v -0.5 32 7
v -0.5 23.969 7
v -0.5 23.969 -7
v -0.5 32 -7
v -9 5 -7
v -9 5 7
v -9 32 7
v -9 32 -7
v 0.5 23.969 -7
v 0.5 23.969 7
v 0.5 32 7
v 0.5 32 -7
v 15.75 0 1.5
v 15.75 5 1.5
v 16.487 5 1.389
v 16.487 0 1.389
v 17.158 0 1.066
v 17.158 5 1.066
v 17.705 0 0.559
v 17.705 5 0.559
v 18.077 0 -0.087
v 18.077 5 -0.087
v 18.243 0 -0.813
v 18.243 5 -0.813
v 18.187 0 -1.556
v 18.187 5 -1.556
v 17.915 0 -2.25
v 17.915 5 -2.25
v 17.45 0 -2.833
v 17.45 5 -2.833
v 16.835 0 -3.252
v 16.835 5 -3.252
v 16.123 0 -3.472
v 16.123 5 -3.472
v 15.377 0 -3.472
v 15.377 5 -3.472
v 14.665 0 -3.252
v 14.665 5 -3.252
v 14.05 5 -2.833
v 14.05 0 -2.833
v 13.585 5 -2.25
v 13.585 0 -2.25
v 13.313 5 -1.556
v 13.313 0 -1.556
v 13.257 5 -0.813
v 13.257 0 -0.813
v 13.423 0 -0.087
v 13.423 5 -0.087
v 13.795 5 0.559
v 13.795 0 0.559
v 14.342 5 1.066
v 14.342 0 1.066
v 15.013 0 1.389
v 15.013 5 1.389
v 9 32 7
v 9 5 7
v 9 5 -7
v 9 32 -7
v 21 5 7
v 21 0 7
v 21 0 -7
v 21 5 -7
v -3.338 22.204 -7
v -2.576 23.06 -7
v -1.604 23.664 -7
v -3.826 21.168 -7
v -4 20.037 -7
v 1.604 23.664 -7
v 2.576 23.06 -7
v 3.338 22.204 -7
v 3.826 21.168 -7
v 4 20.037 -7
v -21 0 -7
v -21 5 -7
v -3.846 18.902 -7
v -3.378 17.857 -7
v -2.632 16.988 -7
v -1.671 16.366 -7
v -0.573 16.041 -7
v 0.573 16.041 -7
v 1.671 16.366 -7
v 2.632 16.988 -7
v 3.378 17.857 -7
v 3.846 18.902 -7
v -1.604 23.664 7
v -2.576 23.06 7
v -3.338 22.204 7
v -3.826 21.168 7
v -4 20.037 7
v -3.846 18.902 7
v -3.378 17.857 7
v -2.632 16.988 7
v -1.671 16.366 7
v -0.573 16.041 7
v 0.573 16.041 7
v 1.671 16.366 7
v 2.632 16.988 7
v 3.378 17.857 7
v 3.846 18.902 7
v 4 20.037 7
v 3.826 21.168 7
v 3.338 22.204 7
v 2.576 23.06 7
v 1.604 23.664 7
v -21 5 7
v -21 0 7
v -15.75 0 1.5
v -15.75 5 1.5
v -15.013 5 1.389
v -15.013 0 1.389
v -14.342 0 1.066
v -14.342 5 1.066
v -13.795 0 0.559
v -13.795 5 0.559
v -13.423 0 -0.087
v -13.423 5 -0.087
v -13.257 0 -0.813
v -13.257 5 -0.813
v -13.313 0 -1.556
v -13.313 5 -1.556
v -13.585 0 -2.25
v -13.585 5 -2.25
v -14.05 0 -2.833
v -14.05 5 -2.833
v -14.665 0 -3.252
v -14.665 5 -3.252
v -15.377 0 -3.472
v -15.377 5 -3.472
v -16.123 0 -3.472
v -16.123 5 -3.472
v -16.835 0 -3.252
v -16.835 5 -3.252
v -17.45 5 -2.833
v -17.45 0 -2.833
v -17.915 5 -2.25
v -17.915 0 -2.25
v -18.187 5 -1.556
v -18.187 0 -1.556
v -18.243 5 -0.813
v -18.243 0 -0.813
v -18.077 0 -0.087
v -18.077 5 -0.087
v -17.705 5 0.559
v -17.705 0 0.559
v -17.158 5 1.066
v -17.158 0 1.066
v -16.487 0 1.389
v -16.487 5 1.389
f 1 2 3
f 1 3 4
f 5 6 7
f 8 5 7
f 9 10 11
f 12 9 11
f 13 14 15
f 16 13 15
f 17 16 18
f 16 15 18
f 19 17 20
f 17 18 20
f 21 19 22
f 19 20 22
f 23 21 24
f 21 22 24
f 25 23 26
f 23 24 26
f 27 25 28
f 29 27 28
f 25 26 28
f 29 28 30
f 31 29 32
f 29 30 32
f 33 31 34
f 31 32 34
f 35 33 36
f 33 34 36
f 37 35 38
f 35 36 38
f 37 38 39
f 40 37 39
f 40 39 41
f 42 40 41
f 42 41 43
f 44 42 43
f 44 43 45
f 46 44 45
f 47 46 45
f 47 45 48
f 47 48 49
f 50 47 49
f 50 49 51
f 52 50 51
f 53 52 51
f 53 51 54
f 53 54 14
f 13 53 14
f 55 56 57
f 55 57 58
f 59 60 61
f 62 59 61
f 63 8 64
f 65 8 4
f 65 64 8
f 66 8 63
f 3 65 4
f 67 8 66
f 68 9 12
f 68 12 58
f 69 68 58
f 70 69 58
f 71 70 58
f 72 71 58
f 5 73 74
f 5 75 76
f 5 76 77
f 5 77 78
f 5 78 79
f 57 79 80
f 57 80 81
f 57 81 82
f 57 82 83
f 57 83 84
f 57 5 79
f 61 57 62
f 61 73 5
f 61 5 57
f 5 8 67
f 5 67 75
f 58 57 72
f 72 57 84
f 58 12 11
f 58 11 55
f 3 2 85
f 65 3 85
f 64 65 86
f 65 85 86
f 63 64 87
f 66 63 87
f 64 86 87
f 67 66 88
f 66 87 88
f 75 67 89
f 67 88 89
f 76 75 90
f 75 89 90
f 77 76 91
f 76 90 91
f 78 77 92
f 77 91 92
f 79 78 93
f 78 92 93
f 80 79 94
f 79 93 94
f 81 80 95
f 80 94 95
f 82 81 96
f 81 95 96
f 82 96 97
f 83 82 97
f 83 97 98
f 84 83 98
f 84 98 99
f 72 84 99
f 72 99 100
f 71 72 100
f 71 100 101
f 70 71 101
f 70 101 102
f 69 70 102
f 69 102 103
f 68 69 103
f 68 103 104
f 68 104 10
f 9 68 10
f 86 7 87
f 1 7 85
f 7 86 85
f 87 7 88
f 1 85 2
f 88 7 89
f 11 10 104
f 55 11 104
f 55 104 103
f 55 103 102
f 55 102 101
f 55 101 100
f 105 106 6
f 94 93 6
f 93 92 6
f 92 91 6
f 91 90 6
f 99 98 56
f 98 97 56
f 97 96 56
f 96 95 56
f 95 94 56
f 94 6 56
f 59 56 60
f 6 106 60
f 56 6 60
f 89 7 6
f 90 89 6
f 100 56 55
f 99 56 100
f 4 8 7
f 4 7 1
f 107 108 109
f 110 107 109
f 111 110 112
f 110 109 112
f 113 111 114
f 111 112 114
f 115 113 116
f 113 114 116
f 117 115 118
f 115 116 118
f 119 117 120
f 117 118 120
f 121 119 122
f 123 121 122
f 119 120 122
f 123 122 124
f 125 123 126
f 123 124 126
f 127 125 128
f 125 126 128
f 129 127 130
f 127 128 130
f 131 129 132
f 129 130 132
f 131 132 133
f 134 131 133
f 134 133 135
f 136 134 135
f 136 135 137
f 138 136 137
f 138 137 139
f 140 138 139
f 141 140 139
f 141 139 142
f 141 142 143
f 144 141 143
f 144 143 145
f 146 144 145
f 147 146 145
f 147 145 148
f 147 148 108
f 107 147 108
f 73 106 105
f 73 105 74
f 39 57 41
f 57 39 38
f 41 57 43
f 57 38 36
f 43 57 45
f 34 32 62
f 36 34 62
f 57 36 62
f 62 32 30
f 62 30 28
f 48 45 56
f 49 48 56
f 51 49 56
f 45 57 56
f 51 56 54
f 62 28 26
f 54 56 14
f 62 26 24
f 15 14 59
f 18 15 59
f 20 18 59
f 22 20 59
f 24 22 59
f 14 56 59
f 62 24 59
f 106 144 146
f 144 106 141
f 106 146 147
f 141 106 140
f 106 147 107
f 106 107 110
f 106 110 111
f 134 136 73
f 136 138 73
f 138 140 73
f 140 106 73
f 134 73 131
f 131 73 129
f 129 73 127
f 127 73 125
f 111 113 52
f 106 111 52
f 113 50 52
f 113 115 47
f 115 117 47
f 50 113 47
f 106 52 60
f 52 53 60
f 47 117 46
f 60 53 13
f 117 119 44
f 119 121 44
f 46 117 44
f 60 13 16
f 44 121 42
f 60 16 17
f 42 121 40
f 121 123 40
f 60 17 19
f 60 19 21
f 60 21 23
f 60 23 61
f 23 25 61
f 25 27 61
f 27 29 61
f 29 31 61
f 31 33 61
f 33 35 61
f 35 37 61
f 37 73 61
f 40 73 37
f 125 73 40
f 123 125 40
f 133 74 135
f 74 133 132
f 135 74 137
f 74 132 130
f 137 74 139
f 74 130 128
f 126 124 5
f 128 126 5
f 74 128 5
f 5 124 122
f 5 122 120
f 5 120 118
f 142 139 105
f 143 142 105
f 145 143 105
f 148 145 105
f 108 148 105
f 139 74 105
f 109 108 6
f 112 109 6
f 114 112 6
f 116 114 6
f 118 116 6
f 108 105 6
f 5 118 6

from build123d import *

# Parameters (mm, degrees)
ESQUISSE1_W             = 42
ESQUISSE1_H             = 14
BOSS_EXTRU_1_DEPTH      = 32
ESQUISSE2_W             = 12
ESQUISSE2_H             = 27
ENL_V_MAT_EXTRU_1_DEPTH = 41.755367745
ESQUISSE3_R             = 4
ENL_V_MAT_EXTRU_2_DEPTH = 41.755367745
ESQUISSE4_W             = 1
ESQUISSE4_H             = 13.961299029
ENL_V_MAT_EXTRU_3_DEPTH = 41.755367745
ESQUISSE5_R             = 2.5
ENL_V_MAT_EXTRU_4_DEPTH = 35.9141805


with BuildPart() as part:
    # Esquisse1 → Boss.-Extru.1 (new body)
    with BuildSketch(Plane(origin=(0, 0, 0), x_dir=(1, 0, 0), z_dir=(0, 1, 0))):
        Rectangle(ESQUISSE1_W, ESQUISSE1_H)
    extrude(amount=BOSS_EXTRU_1_DEPTH)

    # Esquisse2 → Enlèv. mat.-Extru.1 (cut, through all)
    with BuildSketch(Plane.XY.offset(7)):
        with Locations((-15, 18.5)):
            Rectangle(ESQUISSE2_W, ESQUISSE2_H)
        with Locations((15, 18.5)):
            Rectangle(ESQUISSE2_W, ESQUISSE2_H)
    extrude(amount=-ENL_V_MAT_EXTRU_1_DEPTH, mode=Mode.SUBTRACT)

    # Esquisse3 → Enlèv. mat.-Extru.2 (cut, through all)
    with BuildSketch(Plane.XY.offset(7)):
        with Locations((0, 20)):
            Circle(ESQUISSE3_R)
    extrude(amount=-ENL_V_MAT_EXTRU_2_DEPTH, mode=Mode.SUBTRACT)

    # Esquisse4 → Enlèv. mat.-Extru.3 (cut, through all)
    with BuildSketch(Plane.XY.offset(7)):
        with Locations((0, 25.019350485)):
            Rectangle(ESQUISSE4_W, ESQUISSE4_H)
    extrude(amount=-ENL_V_MAT_EXTRU_3_DEPTH, mode=Mode.SUBTRACT)

    # Esquisse5 → Enlèv. mat.-Extru.4 (cut, through all)
    with BuildSketch(Plane(origin=(0, 5, 0), x_dir=(1, 0, 0), z_dir=(0, 1, 0))):
        with Locations(Location((-15.75, 1, 0), (0, 0, 270))):
            Circle(ESQUISSE5_R)
        with Locations(Location((15.75, 1, 0), (0, 0, 270))):
            Circle(ESQUISSE5_R)
    extrude(amount=-ENL_V_MAT_EXTRU_4_DEPTH, mode=Mode.SUBTRACT)


solid = part.part
